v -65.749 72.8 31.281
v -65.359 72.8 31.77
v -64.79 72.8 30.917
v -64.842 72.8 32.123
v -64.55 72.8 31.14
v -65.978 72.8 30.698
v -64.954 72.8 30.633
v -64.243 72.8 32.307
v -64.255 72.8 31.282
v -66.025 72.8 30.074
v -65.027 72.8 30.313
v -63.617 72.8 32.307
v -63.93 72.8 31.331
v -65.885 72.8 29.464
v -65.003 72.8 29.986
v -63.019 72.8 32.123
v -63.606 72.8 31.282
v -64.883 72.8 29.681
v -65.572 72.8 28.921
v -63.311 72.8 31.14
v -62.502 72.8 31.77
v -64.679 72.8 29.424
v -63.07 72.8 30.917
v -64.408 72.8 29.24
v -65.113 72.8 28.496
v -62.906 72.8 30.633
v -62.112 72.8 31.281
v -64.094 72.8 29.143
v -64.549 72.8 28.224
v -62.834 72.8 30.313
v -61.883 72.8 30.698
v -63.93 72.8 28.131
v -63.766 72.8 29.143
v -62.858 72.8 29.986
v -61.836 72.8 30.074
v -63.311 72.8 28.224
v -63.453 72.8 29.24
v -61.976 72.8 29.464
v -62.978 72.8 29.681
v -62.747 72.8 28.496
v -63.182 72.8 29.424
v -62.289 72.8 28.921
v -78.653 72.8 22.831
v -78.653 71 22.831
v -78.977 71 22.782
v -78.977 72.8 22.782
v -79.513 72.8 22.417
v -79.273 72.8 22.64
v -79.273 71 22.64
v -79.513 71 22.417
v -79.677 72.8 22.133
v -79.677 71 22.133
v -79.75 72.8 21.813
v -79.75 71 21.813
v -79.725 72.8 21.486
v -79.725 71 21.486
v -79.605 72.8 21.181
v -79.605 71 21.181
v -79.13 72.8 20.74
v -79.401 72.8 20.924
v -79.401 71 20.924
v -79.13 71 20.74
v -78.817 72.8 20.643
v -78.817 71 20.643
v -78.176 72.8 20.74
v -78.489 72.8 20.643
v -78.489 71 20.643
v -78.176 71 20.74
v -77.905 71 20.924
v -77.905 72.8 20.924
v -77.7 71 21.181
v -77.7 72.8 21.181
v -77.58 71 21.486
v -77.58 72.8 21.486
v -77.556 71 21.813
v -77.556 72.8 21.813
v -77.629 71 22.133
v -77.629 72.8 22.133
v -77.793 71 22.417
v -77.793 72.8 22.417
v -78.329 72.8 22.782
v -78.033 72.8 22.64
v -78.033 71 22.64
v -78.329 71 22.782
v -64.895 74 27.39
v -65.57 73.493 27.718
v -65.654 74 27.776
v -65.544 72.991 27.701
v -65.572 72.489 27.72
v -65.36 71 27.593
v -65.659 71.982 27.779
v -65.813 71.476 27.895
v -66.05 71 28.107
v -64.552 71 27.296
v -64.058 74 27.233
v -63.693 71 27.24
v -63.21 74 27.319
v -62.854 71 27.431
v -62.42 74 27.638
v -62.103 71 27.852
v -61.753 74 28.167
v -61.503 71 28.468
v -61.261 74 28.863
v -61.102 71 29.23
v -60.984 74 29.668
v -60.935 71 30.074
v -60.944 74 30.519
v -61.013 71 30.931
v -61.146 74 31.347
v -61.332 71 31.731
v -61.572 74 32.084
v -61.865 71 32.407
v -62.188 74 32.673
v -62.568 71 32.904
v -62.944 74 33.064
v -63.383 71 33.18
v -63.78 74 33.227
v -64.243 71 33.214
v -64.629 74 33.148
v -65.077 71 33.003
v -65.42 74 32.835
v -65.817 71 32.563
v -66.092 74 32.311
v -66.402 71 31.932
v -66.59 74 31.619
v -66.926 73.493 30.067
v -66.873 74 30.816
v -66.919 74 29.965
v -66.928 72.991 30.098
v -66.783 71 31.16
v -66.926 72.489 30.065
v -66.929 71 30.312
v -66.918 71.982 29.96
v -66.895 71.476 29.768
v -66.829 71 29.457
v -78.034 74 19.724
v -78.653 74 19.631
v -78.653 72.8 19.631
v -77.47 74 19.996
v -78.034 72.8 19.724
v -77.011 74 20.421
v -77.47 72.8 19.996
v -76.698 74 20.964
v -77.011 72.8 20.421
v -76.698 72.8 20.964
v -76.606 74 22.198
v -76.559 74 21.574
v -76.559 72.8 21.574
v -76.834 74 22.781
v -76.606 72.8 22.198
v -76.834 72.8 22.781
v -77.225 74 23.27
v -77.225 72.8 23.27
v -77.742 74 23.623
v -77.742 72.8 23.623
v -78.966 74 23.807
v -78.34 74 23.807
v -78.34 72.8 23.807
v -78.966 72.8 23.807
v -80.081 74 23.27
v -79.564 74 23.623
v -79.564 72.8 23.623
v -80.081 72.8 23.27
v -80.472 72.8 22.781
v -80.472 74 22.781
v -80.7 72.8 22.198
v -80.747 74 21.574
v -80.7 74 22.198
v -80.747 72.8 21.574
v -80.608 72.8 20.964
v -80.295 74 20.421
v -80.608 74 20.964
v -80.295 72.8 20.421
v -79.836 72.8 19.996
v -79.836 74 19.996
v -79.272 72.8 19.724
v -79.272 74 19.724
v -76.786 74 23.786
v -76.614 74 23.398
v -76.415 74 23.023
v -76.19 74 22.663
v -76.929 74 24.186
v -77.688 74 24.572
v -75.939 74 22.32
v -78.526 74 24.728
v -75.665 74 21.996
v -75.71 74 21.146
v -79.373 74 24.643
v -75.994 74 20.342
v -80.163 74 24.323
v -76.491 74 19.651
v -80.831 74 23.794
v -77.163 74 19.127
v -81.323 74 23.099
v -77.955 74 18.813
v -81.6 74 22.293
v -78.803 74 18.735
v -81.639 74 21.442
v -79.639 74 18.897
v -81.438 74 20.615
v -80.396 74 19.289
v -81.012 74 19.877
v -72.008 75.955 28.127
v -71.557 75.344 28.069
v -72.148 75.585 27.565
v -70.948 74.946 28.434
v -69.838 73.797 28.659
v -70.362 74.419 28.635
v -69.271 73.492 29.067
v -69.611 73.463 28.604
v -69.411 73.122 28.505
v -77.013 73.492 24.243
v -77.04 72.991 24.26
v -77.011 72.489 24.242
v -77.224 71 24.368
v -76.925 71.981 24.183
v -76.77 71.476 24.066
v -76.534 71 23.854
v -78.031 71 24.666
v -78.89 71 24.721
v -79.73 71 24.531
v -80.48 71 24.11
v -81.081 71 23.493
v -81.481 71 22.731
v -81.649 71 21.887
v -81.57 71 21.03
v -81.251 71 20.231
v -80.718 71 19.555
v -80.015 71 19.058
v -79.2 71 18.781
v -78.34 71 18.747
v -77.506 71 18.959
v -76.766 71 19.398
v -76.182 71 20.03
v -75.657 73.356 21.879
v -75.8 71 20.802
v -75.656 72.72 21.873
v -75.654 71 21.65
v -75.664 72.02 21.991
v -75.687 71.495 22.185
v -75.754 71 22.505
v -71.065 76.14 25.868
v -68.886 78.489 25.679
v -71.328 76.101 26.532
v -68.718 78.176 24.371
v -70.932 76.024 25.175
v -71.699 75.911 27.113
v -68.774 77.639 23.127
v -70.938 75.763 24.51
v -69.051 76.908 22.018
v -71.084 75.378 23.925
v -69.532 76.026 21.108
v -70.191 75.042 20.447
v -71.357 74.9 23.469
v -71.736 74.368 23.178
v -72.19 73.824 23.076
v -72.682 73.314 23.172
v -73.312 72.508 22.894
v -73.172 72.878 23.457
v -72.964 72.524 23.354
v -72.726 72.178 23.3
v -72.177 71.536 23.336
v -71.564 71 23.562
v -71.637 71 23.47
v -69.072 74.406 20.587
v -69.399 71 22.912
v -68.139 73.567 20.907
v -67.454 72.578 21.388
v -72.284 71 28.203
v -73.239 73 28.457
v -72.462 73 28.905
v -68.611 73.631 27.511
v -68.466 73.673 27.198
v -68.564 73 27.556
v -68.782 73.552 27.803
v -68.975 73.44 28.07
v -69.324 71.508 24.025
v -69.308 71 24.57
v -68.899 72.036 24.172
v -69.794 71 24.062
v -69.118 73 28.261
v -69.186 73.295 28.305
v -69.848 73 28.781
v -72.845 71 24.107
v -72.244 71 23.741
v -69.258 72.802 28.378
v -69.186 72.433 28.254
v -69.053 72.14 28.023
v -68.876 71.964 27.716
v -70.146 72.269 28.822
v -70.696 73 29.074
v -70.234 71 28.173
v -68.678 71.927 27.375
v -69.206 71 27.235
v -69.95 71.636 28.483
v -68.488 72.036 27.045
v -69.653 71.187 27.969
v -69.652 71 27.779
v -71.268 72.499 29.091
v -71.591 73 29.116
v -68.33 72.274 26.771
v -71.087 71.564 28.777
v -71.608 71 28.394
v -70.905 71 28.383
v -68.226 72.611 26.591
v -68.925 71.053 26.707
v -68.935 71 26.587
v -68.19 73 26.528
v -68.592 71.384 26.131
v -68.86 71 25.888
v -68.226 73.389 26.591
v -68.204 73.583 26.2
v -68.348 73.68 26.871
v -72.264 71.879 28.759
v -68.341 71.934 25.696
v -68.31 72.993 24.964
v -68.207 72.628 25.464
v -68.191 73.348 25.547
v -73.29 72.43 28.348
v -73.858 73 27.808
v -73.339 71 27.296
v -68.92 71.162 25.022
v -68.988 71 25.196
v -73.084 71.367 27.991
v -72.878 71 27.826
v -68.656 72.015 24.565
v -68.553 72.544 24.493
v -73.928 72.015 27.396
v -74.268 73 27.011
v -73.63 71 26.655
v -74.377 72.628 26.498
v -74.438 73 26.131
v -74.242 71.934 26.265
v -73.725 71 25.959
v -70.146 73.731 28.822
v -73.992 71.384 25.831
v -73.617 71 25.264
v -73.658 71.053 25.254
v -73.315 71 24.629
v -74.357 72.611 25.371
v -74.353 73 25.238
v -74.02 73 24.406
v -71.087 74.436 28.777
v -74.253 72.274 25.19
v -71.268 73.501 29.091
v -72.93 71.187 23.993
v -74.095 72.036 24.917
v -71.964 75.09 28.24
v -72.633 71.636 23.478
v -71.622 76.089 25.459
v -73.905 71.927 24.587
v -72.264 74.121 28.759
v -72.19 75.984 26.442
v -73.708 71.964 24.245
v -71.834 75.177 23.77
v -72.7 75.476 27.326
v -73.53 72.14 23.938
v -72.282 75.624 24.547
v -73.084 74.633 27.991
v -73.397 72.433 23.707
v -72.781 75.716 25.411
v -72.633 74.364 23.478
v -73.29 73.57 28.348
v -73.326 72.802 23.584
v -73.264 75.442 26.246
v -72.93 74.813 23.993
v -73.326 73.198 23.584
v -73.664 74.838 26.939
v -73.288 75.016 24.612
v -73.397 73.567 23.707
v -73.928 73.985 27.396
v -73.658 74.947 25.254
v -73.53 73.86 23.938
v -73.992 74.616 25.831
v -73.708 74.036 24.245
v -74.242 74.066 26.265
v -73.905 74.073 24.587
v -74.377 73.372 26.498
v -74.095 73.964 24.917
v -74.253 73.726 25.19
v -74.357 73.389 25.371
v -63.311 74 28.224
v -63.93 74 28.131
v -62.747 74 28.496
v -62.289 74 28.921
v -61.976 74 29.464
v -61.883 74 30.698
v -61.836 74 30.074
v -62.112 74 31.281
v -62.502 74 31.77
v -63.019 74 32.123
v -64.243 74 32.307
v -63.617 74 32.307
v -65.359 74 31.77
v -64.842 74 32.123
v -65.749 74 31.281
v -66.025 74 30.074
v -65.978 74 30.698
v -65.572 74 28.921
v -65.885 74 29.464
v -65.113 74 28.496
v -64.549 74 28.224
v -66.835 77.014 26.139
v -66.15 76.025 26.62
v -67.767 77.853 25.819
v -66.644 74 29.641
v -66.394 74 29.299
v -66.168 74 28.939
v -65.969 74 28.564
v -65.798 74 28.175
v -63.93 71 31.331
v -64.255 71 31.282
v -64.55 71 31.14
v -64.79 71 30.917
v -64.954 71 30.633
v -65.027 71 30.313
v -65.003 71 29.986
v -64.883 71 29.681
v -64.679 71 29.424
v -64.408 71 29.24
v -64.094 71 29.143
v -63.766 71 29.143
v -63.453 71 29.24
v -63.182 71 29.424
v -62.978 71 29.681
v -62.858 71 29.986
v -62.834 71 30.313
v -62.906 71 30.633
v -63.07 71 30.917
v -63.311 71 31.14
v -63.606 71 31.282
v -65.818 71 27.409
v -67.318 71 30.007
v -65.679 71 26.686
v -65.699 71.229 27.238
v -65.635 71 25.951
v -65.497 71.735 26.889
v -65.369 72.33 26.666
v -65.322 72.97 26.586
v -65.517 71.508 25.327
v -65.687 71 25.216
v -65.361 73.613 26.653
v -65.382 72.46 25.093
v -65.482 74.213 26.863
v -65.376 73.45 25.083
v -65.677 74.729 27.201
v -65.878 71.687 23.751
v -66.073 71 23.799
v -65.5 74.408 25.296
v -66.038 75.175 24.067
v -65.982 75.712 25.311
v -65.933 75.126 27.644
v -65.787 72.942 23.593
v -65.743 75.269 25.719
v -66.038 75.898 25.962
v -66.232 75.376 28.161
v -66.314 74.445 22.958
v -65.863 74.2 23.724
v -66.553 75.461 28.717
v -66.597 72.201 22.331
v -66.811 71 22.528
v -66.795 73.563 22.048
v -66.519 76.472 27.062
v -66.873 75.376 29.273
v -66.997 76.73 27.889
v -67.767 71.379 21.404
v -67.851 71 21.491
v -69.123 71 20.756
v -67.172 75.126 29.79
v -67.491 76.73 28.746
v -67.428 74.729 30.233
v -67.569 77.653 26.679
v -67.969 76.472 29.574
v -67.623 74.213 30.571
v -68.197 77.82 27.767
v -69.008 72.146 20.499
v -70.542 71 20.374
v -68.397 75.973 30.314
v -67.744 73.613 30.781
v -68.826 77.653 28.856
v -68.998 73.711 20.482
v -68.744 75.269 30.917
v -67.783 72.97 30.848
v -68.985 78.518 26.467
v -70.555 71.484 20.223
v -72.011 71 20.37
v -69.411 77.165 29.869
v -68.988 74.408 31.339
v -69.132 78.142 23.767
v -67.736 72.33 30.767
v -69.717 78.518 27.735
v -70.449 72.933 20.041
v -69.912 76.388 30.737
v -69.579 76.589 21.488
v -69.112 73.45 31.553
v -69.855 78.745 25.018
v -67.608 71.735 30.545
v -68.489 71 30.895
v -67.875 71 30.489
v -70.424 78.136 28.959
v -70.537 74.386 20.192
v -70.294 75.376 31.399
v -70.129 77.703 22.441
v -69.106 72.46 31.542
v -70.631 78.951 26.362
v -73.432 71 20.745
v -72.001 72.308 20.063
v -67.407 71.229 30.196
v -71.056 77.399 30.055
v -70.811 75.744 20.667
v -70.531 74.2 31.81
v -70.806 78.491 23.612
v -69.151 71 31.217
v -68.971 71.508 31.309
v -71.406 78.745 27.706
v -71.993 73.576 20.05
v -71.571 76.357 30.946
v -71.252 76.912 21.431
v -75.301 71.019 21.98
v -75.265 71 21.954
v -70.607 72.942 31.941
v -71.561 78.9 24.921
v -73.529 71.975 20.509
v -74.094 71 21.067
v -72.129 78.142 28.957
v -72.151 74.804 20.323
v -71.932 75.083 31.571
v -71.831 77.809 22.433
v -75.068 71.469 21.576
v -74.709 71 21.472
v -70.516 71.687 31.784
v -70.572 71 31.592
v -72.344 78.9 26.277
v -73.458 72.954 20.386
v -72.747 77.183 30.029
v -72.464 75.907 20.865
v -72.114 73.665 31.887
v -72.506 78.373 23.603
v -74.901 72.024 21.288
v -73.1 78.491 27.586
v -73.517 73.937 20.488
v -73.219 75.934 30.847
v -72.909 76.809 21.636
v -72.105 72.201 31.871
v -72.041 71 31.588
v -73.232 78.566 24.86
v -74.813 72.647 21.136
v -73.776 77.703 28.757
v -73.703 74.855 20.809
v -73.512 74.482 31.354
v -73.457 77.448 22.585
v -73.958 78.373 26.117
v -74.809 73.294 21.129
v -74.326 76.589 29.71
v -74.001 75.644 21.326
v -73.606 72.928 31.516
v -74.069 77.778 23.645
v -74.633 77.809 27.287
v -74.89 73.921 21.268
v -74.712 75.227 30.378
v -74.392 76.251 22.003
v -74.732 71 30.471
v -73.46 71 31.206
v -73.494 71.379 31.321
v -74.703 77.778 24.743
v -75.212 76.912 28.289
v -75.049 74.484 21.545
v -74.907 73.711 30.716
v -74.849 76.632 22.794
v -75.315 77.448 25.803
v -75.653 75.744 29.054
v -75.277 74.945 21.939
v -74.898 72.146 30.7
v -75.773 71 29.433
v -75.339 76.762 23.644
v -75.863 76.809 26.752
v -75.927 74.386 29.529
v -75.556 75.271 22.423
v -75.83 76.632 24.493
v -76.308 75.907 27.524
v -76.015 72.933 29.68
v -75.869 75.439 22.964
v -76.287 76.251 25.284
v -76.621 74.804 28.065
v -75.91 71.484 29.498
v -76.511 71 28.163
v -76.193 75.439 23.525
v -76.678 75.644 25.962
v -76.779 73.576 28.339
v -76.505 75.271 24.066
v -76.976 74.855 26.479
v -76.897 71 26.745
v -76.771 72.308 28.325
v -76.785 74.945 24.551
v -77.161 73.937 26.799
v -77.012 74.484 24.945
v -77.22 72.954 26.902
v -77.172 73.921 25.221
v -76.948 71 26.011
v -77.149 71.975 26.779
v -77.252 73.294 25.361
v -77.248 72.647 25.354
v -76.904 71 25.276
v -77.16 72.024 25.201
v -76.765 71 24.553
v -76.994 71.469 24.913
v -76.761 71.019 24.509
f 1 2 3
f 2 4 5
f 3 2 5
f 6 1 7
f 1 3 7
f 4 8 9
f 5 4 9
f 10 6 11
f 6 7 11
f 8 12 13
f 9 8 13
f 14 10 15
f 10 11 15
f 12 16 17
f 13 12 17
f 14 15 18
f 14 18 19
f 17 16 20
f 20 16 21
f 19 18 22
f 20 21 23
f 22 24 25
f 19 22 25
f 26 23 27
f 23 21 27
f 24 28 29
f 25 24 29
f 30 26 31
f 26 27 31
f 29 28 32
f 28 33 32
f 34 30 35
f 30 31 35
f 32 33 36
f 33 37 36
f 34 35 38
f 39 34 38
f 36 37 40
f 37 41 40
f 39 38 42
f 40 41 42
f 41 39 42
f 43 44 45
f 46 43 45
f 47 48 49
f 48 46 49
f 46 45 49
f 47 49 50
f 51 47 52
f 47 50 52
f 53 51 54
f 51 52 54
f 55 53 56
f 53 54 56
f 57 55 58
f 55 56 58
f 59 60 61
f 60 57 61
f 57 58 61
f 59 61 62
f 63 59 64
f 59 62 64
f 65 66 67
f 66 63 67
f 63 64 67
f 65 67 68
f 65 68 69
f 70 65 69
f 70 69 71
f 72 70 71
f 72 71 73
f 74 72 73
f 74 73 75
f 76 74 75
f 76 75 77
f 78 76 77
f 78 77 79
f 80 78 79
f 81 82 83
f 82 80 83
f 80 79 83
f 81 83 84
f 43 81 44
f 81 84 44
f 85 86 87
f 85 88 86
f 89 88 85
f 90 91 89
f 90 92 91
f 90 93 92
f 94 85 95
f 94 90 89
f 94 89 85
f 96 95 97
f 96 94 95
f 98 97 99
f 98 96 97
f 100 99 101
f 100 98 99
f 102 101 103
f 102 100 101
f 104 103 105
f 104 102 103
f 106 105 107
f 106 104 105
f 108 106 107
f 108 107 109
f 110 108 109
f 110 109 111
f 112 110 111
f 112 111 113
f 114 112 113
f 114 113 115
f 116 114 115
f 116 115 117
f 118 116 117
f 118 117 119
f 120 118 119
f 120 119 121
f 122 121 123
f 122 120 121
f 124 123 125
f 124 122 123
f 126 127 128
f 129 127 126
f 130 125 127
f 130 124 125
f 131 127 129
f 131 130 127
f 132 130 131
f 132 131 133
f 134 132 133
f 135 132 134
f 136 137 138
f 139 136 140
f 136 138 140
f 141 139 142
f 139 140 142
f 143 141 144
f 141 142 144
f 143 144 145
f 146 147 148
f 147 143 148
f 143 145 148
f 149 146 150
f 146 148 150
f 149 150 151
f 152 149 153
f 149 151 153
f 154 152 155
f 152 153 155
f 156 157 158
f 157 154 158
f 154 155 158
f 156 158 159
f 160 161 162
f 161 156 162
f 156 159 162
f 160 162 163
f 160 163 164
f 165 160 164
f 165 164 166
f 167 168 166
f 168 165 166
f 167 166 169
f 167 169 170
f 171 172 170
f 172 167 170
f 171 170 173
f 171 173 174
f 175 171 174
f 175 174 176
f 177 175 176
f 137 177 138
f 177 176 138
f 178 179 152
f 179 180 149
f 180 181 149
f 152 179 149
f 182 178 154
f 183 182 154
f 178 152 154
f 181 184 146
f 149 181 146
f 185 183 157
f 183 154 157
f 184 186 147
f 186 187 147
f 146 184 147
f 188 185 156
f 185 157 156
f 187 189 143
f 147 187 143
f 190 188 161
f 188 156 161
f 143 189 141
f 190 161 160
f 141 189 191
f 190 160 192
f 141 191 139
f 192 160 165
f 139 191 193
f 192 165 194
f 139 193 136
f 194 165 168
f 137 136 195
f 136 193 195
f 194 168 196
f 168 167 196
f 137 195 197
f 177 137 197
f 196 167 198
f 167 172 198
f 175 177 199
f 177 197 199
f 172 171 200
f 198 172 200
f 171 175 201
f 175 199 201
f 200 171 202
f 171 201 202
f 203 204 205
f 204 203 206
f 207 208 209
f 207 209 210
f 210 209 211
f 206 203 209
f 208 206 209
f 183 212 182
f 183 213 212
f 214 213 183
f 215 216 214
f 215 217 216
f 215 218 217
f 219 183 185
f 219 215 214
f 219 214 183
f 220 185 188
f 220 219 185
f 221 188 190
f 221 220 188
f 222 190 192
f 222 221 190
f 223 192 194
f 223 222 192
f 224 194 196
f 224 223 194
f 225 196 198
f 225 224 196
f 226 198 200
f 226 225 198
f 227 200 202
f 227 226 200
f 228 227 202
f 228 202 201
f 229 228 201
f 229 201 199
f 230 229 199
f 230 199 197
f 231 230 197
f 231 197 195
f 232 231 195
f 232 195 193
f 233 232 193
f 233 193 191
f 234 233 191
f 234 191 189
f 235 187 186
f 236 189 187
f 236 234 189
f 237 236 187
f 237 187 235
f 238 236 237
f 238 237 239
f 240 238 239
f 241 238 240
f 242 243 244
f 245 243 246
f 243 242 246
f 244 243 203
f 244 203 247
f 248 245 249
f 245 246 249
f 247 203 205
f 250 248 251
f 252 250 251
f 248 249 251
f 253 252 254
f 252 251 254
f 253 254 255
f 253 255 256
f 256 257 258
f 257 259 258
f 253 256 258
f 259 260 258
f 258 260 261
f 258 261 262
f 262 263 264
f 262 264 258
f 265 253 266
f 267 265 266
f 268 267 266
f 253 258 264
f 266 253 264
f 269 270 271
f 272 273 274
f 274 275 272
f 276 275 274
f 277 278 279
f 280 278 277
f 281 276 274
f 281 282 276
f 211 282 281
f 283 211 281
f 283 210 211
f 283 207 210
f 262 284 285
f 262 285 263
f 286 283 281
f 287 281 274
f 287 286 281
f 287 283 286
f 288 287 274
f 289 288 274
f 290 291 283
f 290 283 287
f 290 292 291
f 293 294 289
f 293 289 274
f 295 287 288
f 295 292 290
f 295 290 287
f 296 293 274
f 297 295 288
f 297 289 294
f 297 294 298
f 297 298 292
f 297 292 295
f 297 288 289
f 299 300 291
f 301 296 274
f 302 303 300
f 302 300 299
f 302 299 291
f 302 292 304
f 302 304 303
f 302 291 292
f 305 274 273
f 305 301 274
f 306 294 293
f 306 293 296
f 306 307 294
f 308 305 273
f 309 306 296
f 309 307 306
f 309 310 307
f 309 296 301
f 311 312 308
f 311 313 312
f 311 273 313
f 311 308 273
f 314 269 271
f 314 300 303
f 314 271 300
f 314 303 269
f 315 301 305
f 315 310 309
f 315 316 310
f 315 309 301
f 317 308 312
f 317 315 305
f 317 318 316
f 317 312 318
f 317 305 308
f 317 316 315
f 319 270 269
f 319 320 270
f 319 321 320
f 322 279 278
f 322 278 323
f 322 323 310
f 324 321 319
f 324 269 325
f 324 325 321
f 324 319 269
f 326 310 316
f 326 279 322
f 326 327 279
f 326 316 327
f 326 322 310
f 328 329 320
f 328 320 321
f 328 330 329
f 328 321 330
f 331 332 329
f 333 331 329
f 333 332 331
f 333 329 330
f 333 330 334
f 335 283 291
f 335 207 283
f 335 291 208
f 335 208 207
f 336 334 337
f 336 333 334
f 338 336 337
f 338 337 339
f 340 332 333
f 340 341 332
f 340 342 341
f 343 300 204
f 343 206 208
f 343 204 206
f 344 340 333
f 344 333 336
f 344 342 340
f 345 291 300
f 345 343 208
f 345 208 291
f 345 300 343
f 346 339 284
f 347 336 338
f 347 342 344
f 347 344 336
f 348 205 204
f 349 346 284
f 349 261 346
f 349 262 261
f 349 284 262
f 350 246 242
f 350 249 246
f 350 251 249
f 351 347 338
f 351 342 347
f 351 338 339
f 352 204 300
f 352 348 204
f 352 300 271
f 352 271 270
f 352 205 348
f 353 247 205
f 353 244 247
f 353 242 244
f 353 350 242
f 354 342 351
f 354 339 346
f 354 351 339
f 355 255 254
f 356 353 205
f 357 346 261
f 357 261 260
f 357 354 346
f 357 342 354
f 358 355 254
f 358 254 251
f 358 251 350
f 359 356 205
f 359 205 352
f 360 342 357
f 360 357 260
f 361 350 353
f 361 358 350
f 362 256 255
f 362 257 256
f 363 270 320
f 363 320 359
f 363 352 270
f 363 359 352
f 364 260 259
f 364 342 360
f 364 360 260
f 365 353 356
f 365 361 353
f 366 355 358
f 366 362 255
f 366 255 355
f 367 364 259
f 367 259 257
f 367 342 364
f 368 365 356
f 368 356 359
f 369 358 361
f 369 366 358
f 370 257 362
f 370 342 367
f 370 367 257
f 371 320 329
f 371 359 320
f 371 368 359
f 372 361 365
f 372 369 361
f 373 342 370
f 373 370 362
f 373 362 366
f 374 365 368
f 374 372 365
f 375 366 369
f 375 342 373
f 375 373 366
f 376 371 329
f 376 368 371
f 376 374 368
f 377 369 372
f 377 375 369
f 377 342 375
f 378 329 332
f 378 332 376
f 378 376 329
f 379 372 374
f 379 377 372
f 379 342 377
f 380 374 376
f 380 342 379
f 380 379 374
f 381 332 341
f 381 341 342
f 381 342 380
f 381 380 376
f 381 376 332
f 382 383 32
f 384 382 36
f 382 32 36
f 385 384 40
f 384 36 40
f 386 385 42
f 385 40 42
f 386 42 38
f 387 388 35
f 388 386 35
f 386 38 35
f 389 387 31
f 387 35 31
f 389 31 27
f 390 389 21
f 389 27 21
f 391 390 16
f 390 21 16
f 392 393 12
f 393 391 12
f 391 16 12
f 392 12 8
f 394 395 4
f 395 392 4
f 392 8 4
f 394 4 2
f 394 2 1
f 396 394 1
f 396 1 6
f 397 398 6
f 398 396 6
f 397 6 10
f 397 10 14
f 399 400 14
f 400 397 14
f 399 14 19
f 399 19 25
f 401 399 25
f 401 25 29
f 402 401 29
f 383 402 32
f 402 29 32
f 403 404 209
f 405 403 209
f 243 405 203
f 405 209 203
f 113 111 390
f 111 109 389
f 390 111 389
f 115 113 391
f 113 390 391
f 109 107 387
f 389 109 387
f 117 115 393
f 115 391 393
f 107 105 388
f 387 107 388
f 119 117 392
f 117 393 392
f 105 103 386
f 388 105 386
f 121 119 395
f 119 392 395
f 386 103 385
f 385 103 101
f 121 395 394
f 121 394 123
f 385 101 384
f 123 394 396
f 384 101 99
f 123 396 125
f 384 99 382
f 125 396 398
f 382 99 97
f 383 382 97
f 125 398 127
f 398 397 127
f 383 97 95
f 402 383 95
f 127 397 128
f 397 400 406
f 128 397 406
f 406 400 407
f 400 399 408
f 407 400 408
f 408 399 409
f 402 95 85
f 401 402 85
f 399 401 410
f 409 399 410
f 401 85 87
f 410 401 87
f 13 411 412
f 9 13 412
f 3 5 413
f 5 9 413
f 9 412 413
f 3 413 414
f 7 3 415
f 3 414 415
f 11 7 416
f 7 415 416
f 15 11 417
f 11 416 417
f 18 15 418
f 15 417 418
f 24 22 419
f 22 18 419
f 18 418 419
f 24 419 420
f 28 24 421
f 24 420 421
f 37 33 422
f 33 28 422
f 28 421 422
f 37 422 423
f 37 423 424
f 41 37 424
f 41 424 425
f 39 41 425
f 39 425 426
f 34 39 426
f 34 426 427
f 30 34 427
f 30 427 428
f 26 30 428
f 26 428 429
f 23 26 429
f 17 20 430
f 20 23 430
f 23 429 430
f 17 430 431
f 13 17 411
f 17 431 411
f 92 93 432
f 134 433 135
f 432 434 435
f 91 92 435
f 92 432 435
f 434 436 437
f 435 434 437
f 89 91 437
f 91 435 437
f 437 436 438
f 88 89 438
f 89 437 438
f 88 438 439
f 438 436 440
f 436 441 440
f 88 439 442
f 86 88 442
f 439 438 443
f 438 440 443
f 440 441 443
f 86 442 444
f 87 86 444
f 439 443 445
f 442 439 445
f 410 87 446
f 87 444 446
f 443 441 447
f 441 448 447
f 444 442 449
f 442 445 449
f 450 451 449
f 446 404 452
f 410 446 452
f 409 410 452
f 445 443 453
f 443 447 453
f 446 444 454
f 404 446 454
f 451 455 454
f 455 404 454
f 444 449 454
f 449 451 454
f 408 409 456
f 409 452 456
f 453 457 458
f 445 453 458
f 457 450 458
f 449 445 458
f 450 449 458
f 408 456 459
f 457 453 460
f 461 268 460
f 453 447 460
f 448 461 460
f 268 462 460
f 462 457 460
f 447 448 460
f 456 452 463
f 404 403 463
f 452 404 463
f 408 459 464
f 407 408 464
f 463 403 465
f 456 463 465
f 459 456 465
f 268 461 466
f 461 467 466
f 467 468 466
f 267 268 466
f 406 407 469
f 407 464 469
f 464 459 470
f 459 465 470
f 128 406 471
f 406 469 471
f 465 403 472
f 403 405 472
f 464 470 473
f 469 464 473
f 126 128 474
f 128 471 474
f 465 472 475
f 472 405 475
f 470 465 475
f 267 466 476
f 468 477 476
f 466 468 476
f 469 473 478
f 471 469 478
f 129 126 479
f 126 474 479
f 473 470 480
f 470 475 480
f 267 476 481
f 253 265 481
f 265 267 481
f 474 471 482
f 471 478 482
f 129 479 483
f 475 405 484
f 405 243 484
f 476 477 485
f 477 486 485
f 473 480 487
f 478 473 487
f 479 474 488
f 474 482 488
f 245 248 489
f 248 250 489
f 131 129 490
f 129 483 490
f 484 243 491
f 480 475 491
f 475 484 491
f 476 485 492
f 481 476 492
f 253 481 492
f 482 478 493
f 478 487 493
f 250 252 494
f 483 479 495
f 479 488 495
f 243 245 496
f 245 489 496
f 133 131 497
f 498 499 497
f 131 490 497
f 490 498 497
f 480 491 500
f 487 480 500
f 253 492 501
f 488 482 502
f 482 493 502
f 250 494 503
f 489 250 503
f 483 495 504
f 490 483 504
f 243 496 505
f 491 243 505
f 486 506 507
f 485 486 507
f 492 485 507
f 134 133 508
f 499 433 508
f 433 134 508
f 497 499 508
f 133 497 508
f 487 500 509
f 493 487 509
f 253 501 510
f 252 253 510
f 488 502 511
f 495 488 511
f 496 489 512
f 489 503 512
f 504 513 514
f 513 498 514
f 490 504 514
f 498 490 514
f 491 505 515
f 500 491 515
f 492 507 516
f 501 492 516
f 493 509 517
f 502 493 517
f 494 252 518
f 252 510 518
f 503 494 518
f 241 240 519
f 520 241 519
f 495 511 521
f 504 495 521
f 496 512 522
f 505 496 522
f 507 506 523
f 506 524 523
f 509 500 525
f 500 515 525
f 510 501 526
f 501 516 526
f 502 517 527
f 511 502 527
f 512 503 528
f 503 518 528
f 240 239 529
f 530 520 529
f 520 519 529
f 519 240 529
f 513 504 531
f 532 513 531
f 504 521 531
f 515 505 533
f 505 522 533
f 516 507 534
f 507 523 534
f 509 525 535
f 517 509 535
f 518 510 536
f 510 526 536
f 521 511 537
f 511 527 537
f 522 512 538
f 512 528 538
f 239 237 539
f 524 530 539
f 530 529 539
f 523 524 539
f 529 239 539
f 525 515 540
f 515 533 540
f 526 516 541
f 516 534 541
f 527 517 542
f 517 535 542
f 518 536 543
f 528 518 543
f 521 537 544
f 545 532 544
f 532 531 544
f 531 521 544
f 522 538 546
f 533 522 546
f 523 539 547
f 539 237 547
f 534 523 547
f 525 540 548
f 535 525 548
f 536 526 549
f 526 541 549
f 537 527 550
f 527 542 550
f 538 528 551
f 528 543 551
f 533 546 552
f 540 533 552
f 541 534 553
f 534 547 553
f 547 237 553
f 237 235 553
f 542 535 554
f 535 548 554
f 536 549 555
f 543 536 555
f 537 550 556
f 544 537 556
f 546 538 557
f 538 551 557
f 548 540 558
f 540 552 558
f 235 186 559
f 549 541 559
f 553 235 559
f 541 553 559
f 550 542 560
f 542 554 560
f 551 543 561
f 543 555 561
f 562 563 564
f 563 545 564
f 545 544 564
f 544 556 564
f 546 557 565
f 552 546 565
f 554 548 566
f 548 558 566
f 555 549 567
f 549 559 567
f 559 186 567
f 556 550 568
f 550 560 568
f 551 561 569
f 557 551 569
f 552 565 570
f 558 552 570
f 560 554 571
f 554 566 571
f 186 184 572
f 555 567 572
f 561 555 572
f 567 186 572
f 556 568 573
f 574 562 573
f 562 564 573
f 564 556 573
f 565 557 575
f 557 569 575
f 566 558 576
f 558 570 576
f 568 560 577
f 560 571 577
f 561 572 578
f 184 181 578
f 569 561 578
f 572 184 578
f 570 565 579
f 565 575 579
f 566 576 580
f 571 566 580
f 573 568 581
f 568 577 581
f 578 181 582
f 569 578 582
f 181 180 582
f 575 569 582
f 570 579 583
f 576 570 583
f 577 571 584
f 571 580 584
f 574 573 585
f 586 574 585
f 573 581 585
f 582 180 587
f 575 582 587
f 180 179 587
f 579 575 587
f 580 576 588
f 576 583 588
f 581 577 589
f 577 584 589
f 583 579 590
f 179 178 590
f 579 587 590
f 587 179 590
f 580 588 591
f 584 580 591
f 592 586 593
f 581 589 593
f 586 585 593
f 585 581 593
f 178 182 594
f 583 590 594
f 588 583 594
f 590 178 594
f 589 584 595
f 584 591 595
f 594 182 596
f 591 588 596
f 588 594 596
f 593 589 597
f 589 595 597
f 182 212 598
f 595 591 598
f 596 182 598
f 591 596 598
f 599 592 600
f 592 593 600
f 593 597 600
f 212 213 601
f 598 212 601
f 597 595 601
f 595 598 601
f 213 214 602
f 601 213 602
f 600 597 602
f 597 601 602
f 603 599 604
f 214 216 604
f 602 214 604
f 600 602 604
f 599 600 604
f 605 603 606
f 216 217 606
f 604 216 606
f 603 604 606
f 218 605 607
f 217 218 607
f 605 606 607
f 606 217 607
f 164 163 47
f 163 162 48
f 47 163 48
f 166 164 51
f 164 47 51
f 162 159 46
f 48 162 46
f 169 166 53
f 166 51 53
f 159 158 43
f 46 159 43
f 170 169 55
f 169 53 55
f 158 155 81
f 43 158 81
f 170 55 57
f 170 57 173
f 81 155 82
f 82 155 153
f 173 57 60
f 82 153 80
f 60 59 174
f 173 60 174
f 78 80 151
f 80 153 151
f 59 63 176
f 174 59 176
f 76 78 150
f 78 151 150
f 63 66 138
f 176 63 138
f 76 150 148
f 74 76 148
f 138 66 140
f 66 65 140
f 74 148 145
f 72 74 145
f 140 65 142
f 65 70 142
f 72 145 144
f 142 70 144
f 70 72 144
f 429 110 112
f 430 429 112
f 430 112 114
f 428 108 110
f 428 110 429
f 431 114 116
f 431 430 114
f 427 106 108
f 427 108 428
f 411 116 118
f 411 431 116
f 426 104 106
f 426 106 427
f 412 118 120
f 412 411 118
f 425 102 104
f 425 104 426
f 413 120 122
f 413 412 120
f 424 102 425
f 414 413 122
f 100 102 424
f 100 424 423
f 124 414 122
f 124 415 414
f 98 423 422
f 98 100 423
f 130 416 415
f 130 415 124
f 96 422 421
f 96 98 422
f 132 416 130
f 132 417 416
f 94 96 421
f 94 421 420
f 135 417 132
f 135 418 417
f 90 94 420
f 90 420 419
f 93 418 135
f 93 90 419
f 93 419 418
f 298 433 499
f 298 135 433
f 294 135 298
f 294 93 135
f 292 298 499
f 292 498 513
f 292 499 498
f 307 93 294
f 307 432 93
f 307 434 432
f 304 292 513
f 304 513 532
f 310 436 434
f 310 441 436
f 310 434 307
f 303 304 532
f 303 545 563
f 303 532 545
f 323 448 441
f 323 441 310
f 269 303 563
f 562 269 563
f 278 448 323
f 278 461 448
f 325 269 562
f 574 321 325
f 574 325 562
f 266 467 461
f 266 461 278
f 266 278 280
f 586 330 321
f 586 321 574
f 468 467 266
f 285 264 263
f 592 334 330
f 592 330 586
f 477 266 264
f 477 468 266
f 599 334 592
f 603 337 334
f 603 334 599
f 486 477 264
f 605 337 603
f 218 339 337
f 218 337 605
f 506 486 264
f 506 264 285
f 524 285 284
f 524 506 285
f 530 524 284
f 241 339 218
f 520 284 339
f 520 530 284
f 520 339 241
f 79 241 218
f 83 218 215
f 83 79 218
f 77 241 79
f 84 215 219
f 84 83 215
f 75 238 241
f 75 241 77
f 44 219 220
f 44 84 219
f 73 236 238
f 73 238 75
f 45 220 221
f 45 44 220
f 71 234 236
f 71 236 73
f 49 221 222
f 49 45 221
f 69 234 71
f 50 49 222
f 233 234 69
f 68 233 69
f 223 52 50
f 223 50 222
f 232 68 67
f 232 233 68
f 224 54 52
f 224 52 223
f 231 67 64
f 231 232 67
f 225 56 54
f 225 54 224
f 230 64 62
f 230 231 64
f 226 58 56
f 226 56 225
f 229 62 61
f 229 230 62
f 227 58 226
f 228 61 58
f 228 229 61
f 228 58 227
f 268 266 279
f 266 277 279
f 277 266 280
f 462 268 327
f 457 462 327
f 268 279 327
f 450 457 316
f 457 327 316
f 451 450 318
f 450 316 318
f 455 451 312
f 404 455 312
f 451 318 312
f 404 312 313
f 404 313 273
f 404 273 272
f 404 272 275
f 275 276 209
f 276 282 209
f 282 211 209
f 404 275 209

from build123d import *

# Parameters (mm, degrees)
DOME_TRIM_SKETCH_W           = 13.999999999999993
DOME_TRIM_SKETCH_H           = 5.000000000000014
DOME_TRIM_DEPTH              = 14
RETAINER_FEATURE_3_PROFILE_R = 3.0000000000000027
RETAINER_FEATURE_3_DEPTH     = 3
RETAINER_FEATURE_4_PROFILE_R = 3.0000000000000027
RETAINER_FEATURE_4_DEPTH     = 3
RETAINER_FEATURE_6_PROFILE_R = 1.1000000000000036
RETAINER_FEATURE_6_DEPTH     = 4.25
RETAINER_FEATURE_7_PROFILE_R = 2.1000000000000045
RETAINER_FEATURE_7_DEPTH     = 1.45
RETAINER_FEATURE_8_PROFILE_R = 1.1000000000000036
RETAINER_FEATURE_8_DEPTH     = 4.25
RETAINER_FEATURE_9_PROFILE_R = 2.1000000000000045
RETAINER_FEATURE_9_DEPTH     = 1.45
RETAINER_FEATURE_12_DEPTH    = 10


with BuildPart() as part:
    # Retainer Dome Sketch → Retainer Dome (revolve)
    with BuildSketch(Plane(origin=(0, -73, 0), x_dir=(-1, 0, 0), z_dir=(0, -1, 0))):
        with BuildLine():
            Line((76.48780366869515, -22.98076211353316), (66.09549882328189, -28.980762113533164))
            ThreePointArc((66.09549882328189, -28.980762113533164), (74.29165124598852, -31.176914536239792), (76.48780366869515, -22.98076211353316))
        make_face()
    revolve(axis=Axis((-62.63139720814413, -73, 30.98076211353316), (-0.8660254037844387, 0, -0.49999999999999994)))

    # Dome Trim Sketch → Dome Trim (cut)
    with BuildSketch(Plane(origin=(-36.156560608000376, 0, -20.874999999999996), x_dir=(-0.49999999999999944, 0, 0.866025403784439), z_dir=(-0.866025403784439, 0, -0.49999999999999944))):
        with Locations((58.145825622994224, -68.5)):
            Rectangle(DOME_TRIM_SKETCH_W, DOME_TRIM_SKETCH_H)
    extrude(amount=DOME_TRIM_DEPTH, mode=Mode.SUBTRACT)

    # Retainer Feature 3 profile → Retainer Feature 3 (add)
    with BuildSketch(Plane(origin=(0, -71.00000000000001, 0), x_dir=(-1, 0, 0), z_dir=(0, -1, 0))):
        with Locations((63.93043531382078, -30.23076211353316)):
            Circle(RETAINER_FEATURE_3_PROFILE_R)
    extrude(amount=RETAINER_FEATURE_3_DEPTH)

    # Retainer Feature 4 profile → Retainer Feature 4 (add)
    with BuildSketch(Plane(origin=(0, -71.00000000000001, 0), x_dir=(-1, 0, 0), z_dir=(0, -1, 0))):
        with Locations((78.65286717815624, -21.73076211353316)):
            Circle(RETAINER_FEATURE_4_PROFILE_R)
    extrude(amount=RETAINER_FEATURE_4_DEPTH)

    # Spherical Seat Sketch → Spherical Seat (revolve, cut)
    with BuildSketch(Plane(origin=(0, -73, 0), x_dir=(-1, 0, 0), z_dir=(0, -1, 0))):
        with BuildLine():
            Line((74.0196312679095, -24.405762113533164), (68.56367122406753, -27.55576211353316))
            ThreePointArc((68.56367122406753, -27.55576211353316), (72.86665124598852, -28.708742135454145), (74.0196312679095, -24.405762113533164))
        make_face()
    revolve(axis=Axis((-62.63139720814413, -73, 30.98076211353316), (-0.8660254037844387, 0, -0.49999999999999994)), mode=Mode.SUBTRACT)

    # Retainer Feature 6 profile → Retainer Feature 6 (cut)
    with BuildSketch(Plane(origin=(0, -70, 0), x_dir=(-1, 0, 0), z_dir=(0, -1, 0))):
        with Locations(Location((63.93043531382078, -30.23076211353316, 0), (0, 0, 270))):
            Circle(RETAINER_FEATURE_6_PROFILE_R)
    extrude(amount=RETAINER_FEATURE_6_DEPTH, mode=Mode.SUBTRACT)

    # Retainer Feature 7 profile → Retainer Feature 7 (cut)
    with BuildSketch(Plane(origin=(0, -72.8, 0), x_dir=(-1, 0, 0), z_dir=(0, -1, 0))):
        with Locations(Location((63.93043531382078, -30.23076211353316, 0), (0, 0, 90))):
            Circle(RETAINER_FEATURE_7_PROFILE_R)
    extrude(amount=RETAINER_FEATURE_7_DEPTH, mode=Mode.SUBTRACT)

    # Retainer Feature 8 profile → Retainer Feature 8 (cut)
    with BuildSketch(Plane(origin=(0, -70, 0), x_dir=(-1, 0, 0), z_dir=(0, -1, 0))):
        with Locations(Location((78.65286717815624, -21.73076211353316, 0), (0, 0, 270))):
            Circle(RETAINER_FEATURE_8_PROFILE_R)
    extrude(amount=RETAINER_FEATURE_8_DEPTH, mode=Mode.SUBTRACT)

    # Retainer Feature 9 profile → Retainer Feature 9 (cut)
    with BuildSketch(Plane(origin=(0, -72.8, 0), x_dir=(-1, 0, 0), z_dir=(0, -1, 0))):
        with Locations(Location((78.65286717815624, -21.73076211353316, 0), (0, 0, 90))):
            Circle(RETAINER_FEATURE_9_PROFILE_R)
    extrude(amount=RETAINER_FEATURE_9_DEPTH, mode=Mode.SUBTRACT)

    # Middle Right Fixed Compression Ball Reta → Retainer Feature 12 (cut)
    with BuildSketch(Plane(origin=(-14.254693004611807, 11.570307263062045, 11.176575862570404), x_dir=(-0.403732922701292, 0.3277035826977628, -0.854172165909264), z_dir=(0.6631997284167646, -0.5383086561091629, -0.5199902989343905))):
        Polygon((-14.819319931758496, -98.86212155097724), (-20.944840012243684, -100.71630701731351), (-19.843917391606514, -104.3533345651016), (-13.718397311121315, -102.49914909876533), align=None)
    extrude(amount=RETAINER_FEATURE_12_DEPTH, mode=Mode.SUBTRACT)


with BuildPart() as body_2:
    # Mirror1: mirrored copy
    add(part.part.mirror(Plane(origin=(0, 0, 0), x_dir=(0, 0, 1), z_dir=(0, -1, 0))))


solid = body_2.part
